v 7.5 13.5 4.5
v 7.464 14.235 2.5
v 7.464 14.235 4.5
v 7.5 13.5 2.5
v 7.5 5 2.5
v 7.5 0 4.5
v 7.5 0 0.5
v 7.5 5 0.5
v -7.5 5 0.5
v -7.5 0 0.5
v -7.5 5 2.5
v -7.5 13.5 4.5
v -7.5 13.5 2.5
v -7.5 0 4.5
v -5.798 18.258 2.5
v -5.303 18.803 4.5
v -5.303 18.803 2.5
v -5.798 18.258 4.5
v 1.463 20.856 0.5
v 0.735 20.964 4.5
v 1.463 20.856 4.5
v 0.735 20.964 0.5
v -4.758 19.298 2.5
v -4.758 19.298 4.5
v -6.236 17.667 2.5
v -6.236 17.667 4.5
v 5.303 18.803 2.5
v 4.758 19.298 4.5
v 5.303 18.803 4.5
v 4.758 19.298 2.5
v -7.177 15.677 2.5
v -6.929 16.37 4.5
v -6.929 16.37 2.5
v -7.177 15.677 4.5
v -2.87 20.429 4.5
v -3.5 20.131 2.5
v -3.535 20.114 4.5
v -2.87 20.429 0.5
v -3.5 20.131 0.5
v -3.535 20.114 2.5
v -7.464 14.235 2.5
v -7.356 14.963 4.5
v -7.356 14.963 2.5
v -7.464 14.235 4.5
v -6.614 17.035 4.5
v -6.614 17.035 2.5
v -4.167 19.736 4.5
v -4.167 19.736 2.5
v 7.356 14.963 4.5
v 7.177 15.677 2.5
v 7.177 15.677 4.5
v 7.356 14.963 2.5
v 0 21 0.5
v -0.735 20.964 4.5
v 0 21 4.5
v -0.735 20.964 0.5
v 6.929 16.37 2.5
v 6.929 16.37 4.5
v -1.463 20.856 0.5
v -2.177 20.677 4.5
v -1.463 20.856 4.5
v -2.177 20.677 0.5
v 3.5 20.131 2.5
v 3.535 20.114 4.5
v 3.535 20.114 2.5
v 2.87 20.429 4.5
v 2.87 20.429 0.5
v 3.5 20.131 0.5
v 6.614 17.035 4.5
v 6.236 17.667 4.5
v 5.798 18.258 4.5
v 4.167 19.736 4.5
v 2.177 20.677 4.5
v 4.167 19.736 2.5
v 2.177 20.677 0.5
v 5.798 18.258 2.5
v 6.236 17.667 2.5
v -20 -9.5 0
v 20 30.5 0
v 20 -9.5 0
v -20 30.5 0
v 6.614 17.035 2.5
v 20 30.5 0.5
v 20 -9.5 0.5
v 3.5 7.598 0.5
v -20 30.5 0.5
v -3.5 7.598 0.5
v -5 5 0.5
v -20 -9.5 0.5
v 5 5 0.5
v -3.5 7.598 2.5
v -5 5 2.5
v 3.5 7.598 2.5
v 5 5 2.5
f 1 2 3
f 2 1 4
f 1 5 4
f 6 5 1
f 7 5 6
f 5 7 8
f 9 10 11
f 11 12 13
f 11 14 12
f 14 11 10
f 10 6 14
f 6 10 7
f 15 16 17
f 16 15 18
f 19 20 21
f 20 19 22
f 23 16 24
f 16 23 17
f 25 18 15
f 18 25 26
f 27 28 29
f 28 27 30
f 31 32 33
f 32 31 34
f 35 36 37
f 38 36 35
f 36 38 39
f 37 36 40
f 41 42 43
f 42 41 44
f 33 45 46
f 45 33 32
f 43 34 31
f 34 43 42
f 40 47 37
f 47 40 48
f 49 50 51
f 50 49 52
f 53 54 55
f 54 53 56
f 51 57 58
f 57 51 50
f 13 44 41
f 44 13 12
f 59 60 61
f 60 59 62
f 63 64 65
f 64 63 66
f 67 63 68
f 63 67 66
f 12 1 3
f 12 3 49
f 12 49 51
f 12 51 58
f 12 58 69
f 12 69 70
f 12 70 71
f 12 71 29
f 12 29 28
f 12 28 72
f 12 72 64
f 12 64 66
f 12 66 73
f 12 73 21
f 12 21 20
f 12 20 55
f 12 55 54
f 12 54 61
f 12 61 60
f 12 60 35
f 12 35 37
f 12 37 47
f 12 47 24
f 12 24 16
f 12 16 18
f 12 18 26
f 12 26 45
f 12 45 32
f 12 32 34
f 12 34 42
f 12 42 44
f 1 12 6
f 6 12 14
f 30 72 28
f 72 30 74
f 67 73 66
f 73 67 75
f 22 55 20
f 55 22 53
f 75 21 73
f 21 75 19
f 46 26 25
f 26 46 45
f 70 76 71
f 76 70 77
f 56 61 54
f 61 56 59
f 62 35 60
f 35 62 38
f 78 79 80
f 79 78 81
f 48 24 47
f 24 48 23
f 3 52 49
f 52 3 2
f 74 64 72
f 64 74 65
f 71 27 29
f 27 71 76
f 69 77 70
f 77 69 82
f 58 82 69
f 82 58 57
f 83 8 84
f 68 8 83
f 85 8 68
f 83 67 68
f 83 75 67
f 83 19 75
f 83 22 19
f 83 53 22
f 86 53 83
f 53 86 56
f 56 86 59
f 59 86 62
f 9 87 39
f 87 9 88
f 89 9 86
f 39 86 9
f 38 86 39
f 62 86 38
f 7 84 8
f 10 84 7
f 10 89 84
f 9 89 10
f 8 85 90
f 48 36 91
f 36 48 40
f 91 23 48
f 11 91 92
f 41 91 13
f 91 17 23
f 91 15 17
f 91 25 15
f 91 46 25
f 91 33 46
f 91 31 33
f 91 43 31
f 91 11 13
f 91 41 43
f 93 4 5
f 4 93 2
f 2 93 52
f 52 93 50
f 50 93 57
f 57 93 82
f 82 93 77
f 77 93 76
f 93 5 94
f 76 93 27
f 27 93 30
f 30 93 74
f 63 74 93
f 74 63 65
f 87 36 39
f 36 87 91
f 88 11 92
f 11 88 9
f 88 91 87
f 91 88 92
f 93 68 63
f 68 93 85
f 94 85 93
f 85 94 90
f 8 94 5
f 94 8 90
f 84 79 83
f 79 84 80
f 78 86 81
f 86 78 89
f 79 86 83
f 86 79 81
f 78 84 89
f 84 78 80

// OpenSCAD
/*

     ,----,
  ,*       *.
 |           |
 |           |
 |           |
 |           |
 |           |
 |           |
 |           |
 |           |
 |___________|
*/

plate=40;

x_plate = 0.5;
x_gap = 2.0;
x_holder = 2.0;

x_max = x_plate + x_gap + x_holder;

y_holder =  15;
y_inner = 7;

z_holder = 16;
z_plus = 5;
z_max = z_holder + z_plus;

$fn = 64;

holder();
// holder_neg();

module holder_neg(){
  translate([0,0,x_plate])
  linear_extrude(x_gap) 
  difference() {
    translate([-(y_holder/2),z_plus,0])
    square([y_holder,z_holder]);

    translate([-(y_inner/2),z_plus,0])
    square([y_inner,z_holder]);

    translate([0,5,0])
    #circle(d=10 ,$fn=6);
  }
}

module holder(){
  difference(){
    linear_extrude(x_max) {
      translate([0,z_max-(y_holder/2),0])
      circle(d=y_holder);
      translate([-(y_holder/2),0,0])
      square([y_holder,z_max-y_holder/2]);
    }
  
  holder_neg();
  }

  translate([-plate/2,-plate/2+z_max/2,0])
  cube([plate,plate,x_plate]);

}
